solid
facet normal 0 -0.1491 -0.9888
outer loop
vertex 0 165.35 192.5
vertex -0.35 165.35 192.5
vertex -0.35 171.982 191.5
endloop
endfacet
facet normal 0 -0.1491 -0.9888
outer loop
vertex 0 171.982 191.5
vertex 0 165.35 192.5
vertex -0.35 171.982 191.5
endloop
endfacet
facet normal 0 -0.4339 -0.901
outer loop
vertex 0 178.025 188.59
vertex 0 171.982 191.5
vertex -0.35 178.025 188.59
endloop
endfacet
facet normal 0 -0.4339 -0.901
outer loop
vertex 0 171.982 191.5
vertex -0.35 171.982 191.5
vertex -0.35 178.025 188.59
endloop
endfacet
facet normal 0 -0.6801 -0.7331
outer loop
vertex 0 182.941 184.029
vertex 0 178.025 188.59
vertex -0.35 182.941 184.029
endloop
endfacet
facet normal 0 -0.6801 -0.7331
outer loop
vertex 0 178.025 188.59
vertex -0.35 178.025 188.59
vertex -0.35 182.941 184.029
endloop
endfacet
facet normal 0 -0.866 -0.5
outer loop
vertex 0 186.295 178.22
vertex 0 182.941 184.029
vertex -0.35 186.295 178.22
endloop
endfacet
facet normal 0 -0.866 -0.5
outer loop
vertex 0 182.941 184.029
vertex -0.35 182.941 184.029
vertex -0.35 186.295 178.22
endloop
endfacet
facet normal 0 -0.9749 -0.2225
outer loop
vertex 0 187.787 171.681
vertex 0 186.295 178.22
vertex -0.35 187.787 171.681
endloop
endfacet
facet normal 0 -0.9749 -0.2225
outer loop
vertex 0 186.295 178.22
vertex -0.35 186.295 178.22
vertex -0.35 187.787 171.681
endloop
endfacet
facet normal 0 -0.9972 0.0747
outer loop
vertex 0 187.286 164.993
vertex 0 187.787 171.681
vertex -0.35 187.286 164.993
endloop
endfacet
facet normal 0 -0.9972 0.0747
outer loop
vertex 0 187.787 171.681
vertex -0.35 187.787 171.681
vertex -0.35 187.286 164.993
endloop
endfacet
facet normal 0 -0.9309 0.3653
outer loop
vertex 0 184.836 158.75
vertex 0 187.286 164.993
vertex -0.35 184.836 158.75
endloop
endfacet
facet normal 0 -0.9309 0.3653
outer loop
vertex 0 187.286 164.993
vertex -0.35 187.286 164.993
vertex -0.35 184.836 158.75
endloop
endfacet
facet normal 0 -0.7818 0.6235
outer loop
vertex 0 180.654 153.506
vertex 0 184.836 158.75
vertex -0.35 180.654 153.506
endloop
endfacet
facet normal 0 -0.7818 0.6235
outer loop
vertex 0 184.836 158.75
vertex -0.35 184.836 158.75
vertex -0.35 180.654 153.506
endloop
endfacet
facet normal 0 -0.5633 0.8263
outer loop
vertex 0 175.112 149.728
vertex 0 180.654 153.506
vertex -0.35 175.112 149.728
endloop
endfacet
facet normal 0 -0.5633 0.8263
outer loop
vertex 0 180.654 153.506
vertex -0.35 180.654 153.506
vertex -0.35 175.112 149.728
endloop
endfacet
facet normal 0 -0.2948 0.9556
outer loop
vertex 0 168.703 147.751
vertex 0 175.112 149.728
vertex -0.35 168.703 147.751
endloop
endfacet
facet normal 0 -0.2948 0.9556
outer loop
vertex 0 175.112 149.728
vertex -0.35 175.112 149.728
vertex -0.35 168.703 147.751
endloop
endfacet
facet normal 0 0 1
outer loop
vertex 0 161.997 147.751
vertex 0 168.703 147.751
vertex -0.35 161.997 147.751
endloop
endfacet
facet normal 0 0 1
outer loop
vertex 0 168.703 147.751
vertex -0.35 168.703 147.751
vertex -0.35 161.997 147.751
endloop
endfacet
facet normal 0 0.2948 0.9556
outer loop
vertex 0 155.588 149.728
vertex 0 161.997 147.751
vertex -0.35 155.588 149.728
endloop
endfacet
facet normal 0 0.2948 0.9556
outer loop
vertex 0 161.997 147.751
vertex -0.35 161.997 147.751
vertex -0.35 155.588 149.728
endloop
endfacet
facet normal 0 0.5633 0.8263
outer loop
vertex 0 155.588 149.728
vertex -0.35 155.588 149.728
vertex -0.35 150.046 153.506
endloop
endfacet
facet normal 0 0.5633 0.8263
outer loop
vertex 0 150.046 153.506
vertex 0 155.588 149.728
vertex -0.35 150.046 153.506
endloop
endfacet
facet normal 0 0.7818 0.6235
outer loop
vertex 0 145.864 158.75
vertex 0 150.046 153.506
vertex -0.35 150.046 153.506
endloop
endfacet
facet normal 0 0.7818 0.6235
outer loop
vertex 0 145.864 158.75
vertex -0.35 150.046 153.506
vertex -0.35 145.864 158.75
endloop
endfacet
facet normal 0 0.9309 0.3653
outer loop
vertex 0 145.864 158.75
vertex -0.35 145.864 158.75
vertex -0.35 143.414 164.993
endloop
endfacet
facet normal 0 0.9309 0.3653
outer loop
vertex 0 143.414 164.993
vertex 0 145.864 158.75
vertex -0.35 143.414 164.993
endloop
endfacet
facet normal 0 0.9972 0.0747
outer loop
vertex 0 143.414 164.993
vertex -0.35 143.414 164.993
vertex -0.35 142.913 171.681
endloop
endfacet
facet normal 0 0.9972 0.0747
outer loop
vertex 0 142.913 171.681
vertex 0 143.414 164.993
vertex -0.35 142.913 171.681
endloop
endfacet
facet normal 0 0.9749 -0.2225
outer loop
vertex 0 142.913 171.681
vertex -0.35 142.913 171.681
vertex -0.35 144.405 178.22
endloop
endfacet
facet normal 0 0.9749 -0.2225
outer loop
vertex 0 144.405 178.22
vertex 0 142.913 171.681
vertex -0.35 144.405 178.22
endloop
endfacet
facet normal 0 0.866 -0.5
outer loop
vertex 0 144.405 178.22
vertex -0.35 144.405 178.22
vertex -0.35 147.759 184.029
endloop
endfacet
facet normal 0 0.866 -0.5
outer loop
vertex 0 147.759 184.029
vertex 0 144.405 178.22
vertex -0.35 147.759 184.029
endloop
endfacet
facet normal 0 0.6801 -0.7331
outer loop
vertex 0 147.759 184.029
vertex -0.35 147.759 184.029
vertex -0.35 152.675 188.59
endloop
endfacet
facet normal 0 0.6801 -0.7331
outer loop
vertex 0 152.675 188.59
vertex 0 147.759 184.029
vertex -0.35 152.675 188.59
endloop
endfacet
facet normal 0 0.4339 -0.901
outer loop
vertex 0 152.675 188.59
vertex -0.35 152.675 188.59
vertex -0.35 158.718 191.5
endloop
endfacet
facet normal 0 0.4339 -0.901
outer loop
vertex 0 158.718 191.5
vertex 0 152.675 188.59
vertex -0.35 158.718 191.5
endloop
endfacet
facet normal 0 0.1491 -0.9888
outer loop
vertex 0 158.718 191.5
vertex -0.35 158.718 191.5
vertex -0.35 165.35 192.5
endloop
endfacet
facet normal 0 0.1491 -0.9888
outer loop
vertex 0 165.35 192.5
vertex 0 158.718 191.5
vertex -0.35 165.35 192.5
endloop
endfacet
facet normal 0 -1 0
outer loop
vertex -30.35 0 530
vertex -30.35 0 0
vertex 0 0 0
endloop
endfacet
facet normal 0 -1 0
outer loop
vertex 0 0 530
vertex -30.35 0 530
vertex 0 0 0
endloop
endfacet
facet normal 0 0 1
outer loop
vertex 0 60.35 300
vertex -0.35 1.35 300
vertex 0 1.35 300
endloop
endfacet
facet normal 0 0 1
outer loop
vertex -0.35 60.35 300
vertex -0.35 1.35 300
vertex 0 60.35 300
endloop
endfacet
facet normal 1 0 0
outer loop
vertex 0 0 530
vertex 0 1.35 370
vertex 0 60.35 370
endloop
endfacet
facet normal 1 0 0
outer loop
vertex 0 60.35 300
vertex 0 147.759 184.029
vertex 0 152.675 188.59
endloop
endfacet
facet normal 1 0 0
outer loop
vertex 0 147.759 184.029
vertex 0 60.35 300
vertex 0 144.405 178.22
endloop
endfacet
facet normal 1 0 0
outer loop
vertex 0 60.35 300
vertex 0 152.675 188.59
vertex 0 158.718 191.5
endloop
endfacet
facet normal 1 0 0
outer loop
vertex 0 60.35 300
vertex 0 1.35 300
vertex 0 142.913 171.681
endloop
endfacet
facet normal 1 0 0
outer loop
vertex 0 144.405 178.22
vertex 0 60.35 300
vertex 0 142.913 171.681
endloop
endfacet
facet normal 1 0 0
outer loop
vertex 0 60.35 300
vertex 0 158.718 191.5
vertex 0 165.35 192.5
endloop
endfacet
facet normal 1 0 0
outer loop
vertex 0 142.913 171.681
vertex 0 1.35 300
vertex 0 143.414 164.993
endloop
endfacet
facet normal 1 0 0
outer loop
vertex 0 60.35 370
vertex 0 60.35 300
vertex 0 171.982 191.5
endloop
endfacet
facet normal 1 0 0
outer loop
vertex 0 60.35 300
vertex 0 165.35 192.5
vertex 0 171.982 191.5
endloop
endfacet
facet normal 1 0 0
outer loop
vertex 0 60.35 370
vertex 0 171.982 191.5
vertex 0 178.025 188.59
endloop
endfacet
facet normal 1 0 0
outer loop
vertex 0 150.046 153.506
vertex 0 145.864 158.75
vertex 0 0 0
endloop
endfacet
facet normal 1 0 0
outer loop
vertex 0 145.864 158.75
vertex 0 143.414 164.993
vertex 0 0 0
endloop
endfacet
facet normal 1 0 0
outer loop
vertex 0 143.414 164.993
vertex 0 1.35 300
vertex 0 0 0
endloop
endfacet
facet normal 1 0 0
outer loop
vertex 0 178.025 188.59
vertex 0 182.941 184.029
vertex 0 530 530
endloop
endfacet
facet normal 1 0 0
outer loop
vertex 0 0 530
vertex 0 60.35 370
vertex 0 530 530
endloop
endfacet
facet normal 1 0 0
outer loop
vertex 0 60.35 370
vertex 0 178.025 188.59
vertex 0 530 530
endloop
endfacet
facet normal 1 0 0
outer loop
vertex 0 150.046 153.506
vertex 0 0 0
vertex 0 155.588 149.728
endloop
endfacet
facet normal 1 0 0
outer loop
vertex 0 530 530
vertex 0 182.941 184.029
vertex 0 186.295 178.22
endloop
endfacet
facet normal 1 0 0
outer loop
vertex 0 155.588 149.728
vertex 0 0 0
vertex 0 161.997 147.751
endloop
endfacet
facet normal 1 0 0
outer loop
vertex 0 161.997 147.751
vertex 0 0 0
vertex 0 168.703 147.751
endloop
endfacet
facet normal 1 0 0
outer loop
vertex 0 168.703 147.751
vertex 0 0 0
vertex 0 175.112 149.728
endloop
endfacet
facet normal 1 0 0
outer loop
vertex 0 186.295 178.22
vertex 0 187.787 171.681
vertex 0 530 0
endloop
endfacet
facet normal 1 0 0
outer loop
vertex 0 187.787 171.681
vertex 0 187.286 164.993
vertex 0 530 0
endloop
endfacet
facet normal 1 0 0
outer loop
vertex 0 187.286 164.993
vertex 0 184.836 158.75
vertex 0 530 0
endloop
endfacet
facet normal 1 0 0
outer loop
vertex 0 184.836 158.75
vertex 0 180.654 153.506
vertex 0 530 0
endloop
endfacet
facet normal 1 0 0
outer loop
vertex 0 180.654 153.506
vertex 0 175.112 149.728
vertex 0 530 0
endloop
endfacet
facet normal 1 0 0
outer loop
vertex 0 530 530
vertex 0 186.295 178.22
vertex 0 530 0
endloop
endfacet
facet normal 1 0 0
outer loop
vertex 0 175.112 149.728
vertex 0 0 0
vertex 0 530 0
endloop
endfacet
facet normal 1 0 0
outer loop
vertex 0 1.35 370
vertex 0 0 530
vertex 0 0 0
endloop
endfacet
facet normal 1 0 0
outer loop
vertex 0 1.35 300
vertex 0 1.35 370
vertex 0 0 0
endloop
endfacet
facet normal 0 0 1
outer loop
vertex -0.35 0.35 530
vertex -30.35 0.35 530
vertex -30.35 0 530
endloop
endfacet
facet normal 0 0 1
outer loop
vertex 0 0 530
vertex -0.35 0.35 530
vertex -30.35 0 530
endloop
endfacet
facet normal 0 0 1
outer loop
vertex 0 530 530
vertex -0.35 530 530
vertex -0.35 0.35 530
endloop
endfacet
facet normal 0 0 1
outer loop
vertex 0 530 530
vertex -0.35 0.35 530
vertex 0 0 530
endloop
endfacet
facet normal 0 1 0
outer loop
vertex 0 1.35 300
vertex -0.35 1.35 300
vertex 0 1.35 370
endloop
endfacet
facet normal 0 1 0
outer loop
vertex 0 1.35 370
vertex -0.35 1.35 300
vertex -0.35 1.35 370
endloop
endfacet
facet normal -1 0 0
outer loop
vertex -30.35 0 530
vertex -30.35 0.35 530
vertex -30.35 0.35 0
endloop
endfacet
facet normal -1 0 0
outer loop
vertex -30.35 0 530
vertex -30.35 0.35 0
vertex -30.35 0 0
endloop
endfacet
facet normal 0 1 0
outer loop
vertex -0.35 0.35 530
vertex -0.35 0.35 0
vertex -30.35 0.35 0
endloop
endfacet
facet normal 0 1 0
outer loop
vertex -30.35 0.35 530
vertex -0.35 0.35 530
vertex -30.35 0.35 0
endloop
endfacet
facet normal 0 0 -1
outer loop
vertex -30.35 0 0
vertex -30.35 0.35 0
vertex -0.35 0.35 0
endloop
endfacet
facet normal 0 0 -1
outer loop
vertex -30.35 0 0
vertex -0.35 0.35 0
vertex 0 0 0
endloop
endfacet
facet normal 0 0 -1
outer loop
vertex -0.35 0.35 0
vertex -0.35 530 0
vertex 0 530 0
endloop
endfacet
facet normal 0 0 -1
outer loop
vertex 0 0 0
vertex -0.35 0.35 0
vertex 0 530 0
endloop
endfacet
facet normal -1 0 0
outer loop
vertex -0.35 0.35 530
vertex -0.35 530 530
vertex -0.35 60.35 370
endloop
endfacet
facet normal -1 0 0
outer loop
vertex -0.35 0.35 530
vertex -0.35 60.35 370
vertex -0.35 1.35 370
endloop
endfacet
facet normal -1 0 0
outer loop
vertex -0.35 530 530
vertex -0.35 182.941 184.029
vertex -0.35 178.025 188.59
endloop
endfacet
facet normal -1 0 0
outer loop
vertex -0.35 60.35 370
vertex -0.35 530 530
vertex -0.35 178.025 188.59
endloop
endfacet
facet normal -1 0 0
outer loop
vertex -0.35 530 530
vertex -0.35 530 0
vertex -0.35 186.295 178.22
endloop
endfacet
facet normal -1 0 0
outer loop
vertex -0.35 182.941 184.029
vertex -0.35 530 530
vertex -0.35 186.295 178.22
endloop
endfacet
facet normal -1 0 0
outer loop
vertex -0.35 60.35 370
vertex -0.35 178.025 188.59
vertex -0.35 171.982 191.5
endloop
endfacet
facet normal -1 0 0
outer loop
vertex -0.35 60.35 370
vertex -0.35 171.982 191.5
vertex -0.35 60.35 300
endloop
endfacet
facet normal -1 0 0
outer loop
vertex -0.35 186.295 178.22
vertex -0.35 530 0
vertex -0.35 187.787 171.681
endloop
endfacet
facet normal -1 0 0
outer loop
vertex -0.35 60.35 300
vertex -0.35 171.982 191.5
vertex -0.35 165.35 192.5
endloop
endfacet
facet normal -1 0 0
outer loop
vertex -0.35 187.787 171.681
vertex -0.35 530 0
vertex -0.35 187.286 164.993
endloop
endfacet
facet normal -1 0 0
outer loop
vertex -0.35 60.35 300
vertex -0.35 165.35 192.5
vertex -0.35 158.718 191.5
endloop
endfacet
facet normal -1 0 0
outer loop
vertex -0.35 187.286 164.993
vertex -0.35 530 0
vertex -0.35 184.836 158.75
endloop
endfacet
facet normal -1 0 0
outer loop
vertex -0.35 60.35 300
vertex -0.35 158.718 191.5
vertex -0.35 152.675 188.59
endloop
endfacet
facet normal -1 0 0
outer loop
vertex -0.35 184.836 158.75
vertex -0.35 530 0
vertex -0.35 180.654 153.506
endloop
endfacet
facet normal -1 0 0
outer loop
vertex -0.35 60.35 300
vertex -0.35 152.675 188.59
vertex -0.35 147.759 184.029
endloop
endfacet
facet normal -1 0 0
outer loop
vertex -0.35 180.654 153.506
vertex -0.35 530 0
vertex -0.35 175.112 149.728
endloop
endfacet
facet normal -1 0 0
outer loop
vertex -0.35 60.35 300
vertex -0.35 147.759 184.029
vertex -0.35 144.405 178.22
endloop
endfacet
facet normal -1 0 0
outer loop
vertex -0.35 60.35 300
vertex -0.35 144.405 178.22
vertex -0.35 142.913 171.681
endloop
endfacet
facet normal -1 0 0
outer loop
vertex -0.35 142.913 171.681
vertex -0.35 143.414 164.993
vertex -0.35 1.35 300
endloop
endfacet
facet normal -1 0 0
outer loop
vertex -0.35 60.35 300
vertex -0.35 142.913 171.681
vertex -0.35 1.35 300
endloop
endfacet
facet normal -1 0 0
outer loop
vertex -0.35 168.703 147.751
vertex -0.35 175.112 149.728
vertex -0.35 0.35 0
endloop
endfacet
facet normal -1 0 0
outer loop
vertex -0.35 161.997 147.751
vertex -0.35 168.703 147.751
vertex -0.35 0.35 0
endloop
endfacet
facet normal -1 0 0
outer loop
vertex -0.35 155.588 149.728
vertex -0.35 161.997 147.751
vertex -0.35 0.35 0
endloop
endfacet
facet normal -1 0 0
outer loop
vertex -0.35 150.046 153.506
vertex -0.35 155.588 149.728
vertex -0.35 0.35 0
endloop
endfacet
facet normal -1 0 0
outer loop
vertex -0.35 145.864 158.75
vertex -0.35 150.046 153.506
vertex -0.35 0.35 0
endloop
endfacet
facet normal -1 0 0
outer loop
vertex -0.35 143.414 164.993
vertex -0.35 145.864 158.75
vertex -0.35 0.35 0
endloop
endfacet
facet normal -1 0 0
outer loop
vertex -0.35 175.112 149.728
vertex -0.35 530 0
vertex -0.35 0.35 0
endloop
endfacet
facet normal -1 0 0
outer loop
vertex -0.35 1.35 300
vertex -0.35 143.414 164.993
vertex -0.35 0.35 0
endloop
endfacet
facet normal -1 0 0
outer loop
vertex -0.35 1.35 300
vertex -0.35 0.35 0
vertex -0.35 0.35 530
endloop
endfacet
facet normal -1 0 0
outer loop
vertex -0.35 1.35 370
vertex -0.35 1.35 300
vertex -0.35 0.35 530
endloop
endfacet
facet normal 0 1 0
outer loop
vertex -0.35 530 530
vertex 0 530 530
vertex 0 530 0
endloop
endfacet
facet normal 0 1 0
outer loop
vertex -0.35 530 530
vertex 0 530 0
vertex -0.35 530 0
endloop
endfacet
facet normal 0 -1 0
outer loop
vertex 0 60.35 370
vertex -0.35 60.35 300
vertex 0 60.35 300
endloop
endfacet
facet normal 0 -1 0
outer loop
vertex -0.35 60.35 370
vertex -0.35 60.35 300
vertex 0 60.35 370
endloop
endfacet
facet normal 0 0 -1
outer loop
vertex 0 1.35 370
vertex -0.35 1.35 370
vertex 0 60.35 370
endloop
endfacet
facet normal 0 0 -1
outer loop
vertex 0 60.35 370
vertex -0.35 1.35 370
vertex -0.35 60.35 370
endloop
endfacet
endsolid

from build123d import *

# Parameters (mm, degrees)
BOSS_EXTRUDE1_DEPTH = 530
SKETCH2_R           = 22.5
CUT_EXTRUDE1_DEPTH  = 530
SKETCH3_W           = 70
SKETCH3_H           = 59
CUT_EXTRUDE2_DEPTH  = 530


with BuildPart() as part:
    # Sketch1 → Boss-Extrude1 (new body)
    with BuildSketch(Plane.XY):
        Polygon((0, 0), (0, 530), (-0.35, 530), (-0.35, 0.35), (-30.35, 0.35), (-30.35, 0), align=None)
    extrude(amount=BOSS_EXTRUDE1_DEPTH)

    # Sketch2 → Cut-Extrude1 (cut)
    with BuildSketch(Plane.ZY.offset(0.35)):
        with Locations((170, 165.35)):
            Circle(SKETCH2_R)
    extrude(amount=-CUT_EXTRUDE1_DEPTH, mode=Mode.SUBTRACT)

    # Sketch3 → Cut-Extrude2 (cut)
    with BuildSketch(Plane.ZY.offset(0.35)):
        with Locations((335, 30.85)):
            Rectangle(SKETCH3_W, SKETCH3_H)
    extrude(amount=-CUT_EXTRUDE2_DEPTH, mode=Mode.SUBTRACT)


solid = part.part
